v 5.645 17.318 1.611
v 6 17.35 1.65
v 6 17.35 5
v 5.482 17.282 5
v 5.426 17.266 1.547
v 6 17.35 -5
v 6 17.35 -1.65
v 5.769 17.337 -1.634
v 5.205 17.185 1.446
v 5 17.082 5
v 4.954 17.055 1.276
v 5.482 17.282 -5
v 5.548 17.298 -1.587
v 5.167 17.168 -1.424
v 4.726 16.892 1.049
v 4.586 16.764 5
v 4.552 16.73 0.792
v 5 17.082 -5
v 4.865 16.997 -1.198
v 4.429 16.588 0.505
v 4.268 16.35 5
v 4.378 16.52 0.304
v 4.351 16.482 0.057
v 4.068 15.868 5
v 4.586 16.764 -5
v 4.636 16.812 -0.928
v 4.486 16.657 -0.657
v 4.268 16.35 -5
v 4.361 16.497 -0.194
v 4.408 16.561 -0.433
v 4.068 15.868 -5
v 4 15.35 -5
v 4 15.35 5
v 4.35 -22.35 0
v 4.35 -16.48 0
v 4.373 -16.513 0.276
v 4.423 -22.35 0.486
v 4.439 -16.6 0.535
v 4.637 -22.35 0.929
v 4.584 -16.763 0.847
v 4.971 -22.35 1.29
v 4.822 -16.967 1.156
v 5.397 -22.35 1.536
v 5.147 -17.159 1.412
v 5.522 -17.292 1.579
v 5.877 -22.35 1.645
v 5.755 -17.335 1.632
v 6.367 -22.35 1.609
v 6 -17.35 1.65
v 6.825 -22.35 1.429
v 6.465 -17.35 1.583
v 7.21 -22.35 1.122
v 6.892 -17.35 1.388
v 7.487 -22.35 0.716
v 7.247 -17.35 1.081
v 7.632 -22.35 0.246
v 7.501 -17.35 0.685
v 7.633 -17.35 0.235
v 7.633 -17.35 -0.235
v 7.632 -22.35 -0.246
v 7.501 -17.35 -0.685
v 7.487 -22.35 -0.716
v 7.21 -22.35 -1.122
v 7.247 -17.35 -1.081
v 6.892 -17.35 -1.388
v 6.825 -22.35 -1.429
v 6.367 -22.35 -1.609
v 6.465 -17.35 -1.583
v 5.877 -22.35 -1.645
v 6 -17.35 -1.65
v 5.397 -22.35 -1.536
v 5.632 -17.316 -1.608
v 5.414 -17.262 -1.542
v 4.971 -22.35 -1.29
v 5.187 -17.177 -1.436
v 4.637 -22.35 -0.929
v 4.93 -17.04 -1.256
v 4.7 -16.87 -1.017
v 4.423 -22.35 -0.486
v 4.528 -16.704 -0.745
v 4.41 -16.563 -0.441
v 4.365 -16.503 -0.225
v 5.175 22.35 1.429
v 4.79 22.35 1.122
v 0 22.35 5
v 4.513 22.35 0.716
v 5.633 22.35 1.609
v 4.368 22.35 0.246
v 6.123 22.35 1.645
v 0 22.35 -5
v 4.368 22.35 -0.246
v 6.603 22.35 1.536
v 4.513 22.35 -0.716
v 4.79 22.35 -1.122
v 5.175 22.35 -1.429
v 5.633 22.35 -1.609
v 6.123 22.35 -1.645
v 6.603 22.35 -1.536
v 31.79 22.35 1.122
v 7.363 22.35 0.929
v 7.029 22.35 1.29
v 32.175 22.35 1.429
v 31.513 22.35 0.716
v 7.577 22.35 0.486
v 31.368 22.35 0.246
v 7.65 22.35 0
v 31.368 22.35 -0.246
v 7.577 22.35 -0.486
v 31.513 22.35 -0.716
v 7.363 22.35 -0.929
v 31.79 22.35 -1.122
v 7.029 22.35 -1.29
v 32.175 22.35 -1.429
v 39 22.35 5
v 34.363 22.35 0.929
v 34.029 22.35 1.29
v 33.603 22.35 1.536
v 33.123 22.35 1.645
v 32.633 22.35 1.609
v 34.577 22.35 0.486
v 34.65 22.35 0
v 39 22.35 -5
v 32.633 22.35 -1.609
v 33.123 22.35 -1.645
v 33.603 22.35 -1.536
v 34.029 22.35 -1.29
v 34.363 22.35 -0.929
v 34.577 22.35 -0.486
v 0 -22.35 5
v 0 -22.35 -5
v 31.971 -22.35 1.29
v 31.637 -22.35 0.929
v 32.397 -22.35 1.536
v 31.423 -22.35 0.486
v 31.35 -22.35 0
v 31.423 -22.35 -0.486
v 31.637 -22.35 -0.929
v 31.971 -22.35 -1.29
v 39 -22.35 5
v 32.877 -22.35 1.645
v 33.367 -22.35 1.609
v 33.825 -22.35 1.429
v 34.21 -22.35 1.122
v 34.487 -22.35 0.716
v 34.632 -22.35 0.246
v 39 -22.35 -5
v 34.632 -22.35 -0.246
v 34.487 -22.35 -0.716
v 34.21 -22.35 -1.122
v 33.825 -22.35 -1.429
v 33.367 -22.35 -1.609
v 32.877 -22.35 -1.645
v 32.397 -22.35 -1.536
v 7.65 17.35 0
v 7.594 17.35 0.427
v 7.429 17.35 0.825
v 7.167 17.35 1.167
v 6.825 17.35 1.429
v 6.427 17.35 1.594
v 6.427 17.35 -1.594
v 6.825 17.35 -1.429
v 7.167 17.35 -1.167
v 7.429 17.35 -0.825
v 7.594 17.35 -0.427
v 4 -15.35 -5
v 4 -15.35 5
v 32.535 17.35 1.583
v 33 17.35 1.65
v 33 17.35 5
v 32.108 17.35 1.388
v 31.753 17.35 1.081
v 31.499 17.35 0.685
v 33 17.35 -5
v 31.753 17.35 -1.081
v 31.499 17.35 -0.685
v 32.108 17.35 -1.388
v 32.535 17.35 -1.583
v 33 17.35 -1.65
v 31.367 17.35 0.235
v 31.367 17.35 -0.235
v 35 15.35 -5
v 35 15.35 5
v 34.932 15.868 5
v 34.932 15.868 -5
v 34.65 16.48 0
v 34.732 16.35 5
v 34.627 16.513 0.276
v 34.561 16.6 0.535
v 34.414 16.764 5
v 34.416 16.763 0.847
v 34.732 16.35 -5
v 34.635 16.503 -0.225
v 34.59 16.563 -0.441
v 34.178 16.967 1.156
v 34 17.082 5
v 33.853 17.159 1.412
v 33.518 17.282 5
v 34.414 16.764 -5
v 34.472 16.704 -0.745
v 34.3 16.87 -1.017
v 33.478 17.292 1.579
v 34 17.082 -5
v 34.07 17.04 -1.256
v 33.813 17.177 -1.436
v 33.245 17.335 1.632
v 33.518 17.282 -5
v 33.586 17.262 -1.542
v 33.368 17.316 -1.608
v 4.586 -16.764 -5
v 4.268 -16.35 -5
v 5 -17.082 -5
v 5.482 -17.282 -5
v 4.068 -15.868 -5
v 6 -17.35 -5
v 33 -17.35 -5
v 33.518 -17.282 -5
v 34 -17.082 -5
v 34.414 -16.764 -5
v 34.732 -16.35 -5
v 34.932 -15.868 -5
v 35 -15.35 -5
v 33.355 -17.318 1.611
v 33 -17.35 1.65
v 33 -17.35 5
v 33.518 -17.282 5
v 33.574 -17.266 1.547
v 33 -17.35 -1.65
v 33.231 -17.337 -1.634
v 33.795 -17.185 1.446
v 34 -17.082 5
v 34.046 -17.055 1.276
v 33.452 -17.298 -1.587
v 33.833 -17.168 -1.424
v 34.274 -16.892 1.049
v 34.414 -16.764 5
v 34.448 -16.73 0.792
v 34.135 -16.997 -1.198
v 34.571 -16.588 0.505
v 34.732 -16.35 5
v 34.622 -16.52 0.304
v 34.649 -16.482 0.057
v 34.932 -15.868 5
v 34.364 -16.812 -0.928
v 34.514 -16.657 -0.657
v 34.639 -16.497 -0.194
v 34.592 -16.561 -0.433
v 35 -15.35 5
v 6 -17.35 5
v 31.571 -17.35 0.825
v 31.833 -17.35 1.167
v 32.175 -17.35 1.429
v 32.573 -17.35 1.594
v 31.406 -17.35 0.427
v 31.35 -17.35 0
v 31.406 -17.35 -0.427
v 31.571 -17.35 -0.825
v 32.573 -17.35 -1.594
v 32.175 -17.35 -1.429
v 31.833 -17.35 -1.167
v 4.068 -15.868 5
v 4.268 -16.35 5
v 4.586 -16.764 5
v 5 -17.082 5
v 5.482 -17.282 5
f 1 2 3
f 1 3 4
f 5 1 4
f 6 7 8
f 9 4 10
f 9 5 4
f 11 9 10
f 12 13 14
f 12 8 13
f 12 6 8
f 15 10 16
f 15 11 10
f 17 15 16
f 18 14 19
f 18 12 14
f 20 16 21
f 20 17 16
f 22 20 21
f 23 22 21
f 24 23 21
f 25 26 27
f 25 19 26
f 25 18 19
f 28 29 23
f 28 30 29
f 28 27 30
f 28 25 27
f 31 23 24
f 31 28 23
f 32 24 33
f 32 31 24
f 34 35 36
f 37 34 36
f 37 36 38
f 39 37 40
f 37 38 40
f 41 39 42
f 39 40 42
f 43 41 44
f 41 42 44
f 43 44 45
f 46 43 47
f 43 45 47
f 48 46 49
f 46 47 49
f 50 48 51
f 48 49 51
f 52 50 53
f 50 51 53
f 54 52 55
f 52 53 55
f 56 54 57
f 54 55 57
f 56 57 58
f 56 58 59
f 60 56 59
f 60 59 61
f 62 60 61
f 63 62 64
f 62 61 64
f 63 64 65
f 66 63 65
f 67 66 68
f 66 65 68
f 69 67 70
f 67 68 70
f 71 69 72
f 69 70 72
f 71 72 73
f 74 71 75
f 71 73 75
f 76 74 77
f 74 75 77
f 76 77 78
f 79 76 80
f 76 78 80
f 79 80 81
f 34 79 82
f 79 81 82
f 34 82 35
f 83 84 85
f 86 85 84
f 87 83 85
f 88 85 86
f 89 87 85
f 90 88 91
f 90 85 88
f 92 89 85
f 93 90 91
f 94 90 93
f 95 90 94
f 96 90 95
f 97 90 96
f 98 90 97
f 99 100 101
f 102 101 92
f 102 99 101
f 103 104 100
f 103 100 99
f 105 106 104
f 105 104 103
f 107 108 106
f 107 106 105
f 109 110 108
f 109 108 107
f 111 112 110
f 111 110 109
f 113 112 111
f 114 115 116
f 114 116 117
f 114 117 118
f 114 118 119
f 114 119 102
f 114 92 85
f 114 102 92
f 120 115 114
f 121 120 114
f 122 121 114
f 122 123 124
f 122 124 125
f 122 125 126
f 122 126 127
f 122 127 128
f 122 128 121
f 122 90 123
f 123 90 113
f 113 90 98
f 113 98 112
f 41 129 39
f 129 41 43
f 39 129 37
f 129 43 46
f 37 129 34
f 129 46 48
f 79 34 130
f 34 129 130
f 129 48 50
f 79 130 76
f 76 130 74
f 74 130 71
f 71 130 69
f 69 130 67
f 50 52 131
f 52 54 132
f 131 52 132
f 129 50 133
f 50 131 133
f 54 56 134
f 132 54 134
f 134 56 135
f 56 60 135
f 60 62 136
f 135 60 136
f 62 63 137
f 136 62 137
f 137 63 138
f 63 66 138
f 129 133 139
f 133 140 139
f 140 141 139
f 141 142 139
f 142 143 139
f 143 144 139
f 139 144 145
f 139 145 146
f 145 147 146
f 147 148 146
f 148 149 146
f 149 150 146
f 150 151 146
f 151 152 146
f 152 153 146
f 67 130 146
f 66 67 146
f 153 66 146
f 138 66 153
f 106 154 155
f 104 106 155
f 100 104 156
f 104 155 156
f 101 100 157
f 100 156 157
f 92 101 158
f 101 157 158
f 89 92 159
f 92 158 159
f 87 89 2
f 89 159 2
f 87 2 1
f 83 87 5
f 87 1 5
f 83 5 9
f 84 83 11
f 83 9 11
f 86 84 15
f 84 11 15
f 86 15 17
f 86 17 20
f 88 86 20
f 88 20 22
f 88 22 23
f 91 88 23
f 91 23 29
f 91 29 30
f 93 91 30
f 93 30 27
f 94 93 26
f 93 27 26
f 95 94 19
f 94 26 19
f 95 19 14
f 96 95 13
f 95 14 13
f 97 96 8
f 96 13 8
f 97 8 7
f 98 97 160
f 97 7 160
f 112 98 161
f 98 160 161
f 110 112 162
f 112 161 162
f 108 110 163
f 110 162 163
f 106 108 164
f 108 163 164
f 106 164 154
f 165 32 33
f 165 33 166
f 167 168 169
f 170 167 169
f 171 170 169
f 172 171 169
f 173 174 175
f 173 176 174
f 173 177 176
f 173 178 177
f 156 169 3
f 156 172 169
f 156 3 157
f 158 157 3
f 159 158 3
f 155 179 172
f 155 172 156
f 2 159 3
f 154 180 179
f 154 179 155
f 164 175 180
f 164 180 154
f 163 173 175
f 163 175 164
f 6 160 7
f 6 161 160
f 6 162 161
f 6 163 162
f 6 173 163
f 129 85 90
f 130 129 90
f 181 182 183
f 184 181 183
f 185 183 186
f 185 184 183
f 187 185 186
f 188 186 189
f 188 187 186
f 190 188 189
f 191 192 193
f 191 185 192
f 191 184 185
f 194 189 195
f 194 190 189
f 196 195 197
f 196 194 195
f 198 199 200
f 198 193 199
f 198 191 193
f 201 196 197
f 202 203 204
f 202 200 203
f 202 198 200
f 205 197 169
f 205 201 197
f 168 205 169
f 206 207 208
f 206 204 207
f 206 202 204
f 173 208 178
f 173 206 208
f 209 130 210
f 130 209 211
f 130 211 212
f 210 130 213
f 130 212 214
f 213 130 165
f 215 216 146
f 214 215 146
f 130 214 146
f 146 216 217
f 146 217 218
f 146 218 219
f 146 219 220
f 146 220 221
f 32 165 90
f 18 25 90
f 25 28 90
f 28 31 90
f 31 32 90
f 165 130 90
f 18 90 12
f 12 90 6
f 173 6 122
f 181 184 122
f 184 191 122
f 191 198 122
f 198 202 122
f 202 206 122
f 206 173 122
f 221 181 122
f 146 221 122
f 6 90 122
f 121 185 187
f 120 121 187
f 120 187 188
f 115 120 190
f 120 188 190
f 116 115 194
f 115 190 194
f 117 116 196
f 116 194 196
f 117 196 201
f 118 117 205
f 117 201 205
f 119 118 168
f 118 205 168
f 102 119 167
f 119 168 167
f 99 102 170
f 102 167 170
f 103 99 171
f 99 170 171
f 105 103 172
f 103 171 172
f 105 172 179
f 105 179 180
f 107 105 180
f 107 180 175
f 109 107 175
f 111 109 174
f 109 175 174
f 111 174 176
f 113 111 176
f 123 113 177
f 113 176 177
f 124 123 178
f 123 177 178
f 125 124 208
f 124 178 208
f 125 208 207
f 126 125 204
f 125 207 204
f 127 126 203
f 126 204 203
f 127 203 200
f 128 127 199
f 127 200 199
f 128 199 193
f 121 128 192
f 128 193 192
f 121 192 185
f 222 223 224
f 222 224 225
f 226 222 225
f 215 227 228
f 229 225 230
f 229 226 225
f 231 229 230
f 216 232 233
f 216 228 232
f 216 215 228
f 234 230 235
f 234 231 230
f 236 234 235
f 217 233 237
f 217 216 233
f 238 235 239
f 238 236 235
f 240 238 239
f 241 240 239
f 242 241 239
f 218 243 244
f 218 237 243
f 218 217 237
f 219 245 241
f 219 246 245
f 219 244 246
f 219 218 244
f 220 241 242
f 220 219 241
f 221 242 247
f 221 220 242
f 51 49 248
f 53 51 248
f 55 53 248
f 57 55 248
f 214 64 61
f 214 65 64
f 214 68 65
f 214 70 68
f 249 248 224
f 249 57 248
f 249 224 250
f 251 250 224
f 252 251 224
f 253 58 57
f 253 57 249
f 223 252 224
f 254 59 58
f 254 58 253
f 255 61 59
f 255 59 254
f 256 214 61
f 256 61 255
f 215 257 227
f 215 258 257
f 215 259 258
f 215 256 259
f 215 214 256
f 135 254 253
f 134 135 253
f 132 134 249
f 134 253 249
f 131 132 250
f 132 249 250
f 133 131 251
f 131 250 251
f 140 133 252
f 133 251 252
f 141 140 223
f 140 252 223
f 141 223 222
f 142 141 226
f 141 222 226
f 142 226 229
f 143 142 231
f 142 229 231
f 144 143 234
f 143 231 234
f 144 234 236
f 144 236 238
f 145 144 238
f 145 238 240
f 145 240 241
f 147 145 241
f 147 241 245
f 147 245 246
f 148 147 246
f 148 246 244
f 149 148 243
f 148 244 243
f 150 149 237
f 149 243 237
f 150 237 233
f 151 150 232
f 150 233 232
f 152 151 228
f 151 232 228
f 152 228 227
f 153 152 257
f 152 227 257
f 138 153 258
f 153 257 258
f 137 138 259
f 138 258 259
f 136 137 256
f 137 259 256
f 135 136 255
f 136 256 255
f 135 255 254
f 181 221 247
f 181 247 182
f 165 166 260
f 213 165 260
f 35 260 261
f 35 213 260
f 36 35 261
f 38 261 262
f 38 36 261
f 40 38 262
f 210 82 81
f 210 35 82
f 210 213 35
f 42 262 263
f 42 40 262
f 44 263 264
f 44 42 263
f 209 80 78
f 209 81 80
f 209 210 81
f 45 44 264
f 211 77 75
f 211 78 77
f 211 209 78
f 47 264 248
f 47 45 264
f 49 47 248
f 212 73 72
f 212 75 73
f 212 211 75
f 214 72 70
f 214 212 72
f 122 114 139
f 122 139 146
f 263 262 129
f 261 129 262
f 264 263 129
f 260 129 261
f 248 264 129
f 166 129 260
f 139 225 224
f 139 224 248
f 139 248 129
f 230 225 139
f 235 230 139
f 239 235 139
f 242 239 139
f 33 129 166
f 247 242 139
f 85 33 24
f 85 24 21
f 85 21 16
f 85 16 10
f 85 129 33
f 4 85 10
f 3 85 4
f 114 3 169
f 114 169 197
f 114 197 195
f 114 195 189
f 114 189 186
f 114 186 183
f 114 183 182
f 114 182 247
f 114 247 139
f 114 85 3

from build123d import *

# Parameters (mm, degrees)
ESQUISSE1_W               = 39
ESQUISSE1_H               = 10
EXTRUSION1_DEPTH          = 22.35
TROU_TARAUD_M4X0_71_D     = 3.3
TROU_TARAUD_M4X0_71_DEPTH = 10.1
TROU_TARAUD_M4X0_71_TIP   = 0.991420021
TROU_TARAUD_M4X0_72_D     = 3.3
TROU_TARAUD_M4X0_72_DEPTH = 10.1
TROU_TARAUD_M4X0_72_TIP   = 0.991420021
ENL_V_MAT_EXTRU_1_DEPTH   = 47.049131371


with BuildPart() as part:
    # Esquisse1 → Extrusion1 (new, symmetric)
    with BuildSketch(Plane(origin=(0, 0, 0), x_dir=(1, 0, 0), z_dir=(0, 1, 0))):
        with Locations((19.5, 0)):
            Rectangle(ESQUISSE1_W, ESQUISSE1_H)
    extrude(amount=EXTRUSION1_DEPTH, both=True)

    # Trou taraudé M4x0.71
    with Locations(Plane.XZ.offset(22.35)):
        with Locations((33, 0), (6, 0)):
            Hole(TROU_TARAUD_M4X0_71_D / 2, depth=TROU_TARAUD_M4X0_71_DEPTH)
            with Locations((0, 0, -(TROU_TARAUD_M4X0_71_DEPTH + TROU_TARAUD_M4X0_71_TIP / 2))):  # 118° drill point
                Cone(0, TROU_TARAUD_M4X0_71_D / 2, TROU_TARAUD_M4X0_71_TIP, mode=Mode.SUBTRACT)

    # Trou taraudé M4x0.72
    with Locations(Plane(origin=(0, 22.35, 0), x_dir=(-1, 0, 0), z_dir=(0, 1, 0))):
        with Locations((-6, 0), (-33, 0)):
            Hole(TROU_TARAUD_M4X0_72_D / 2, depth=TROU_TARAUD_M4X0_72_DEPTH)
            with Locations((0, 0, -(TROU_TARAUD_M4X0_72_DEPTH + TROU_TARAUD_M4X0_72_TIP / 2))):  # 118° drill point
                Cone(0, TROU_TARAUD_M4X0_72_D / 2, TROU_TARAUD_M4X0_72_TIP, mode=Mode.SUBTRACT)

    # Esquisse8 → Enlèv. mat.-Extru.1 (cut, through all)
    with BuildSketch(Plane(origin=(0, 0, -5), x_dir=(-1, 0, 0), z_dir=(0, 0, -1))):
        with BuildLine():
            Line((-33, 17.35), (-6, 17.35))
            ThreePointArc((-6, 17.35), (-4.585786438, 16.764213562), (-4, 15.35))
            Line((-4, 15.35), (-4, -15.35))
            ThreePointArc((-4, -15.35), (-4.585786438, -16.764213562), (-6, -17.35))
            Line((-6, -17.35), (-33, -17.35))
            ThreePointArc((-33, -17.35), (-34.414213562, -16.764213562), (-35, -15.35))
            Line((-35, -15.35), (-35, 15.35))
            ThreePointArc((-35, 15.35), (-34.414213562, 16.764213562), (-33, 17.35))
        make_face()
    extrude(amount=-ENL_V_MAT_EXTRU_1_DEPTH, mode=Mode.SUBTRACT)


solid = part.part
